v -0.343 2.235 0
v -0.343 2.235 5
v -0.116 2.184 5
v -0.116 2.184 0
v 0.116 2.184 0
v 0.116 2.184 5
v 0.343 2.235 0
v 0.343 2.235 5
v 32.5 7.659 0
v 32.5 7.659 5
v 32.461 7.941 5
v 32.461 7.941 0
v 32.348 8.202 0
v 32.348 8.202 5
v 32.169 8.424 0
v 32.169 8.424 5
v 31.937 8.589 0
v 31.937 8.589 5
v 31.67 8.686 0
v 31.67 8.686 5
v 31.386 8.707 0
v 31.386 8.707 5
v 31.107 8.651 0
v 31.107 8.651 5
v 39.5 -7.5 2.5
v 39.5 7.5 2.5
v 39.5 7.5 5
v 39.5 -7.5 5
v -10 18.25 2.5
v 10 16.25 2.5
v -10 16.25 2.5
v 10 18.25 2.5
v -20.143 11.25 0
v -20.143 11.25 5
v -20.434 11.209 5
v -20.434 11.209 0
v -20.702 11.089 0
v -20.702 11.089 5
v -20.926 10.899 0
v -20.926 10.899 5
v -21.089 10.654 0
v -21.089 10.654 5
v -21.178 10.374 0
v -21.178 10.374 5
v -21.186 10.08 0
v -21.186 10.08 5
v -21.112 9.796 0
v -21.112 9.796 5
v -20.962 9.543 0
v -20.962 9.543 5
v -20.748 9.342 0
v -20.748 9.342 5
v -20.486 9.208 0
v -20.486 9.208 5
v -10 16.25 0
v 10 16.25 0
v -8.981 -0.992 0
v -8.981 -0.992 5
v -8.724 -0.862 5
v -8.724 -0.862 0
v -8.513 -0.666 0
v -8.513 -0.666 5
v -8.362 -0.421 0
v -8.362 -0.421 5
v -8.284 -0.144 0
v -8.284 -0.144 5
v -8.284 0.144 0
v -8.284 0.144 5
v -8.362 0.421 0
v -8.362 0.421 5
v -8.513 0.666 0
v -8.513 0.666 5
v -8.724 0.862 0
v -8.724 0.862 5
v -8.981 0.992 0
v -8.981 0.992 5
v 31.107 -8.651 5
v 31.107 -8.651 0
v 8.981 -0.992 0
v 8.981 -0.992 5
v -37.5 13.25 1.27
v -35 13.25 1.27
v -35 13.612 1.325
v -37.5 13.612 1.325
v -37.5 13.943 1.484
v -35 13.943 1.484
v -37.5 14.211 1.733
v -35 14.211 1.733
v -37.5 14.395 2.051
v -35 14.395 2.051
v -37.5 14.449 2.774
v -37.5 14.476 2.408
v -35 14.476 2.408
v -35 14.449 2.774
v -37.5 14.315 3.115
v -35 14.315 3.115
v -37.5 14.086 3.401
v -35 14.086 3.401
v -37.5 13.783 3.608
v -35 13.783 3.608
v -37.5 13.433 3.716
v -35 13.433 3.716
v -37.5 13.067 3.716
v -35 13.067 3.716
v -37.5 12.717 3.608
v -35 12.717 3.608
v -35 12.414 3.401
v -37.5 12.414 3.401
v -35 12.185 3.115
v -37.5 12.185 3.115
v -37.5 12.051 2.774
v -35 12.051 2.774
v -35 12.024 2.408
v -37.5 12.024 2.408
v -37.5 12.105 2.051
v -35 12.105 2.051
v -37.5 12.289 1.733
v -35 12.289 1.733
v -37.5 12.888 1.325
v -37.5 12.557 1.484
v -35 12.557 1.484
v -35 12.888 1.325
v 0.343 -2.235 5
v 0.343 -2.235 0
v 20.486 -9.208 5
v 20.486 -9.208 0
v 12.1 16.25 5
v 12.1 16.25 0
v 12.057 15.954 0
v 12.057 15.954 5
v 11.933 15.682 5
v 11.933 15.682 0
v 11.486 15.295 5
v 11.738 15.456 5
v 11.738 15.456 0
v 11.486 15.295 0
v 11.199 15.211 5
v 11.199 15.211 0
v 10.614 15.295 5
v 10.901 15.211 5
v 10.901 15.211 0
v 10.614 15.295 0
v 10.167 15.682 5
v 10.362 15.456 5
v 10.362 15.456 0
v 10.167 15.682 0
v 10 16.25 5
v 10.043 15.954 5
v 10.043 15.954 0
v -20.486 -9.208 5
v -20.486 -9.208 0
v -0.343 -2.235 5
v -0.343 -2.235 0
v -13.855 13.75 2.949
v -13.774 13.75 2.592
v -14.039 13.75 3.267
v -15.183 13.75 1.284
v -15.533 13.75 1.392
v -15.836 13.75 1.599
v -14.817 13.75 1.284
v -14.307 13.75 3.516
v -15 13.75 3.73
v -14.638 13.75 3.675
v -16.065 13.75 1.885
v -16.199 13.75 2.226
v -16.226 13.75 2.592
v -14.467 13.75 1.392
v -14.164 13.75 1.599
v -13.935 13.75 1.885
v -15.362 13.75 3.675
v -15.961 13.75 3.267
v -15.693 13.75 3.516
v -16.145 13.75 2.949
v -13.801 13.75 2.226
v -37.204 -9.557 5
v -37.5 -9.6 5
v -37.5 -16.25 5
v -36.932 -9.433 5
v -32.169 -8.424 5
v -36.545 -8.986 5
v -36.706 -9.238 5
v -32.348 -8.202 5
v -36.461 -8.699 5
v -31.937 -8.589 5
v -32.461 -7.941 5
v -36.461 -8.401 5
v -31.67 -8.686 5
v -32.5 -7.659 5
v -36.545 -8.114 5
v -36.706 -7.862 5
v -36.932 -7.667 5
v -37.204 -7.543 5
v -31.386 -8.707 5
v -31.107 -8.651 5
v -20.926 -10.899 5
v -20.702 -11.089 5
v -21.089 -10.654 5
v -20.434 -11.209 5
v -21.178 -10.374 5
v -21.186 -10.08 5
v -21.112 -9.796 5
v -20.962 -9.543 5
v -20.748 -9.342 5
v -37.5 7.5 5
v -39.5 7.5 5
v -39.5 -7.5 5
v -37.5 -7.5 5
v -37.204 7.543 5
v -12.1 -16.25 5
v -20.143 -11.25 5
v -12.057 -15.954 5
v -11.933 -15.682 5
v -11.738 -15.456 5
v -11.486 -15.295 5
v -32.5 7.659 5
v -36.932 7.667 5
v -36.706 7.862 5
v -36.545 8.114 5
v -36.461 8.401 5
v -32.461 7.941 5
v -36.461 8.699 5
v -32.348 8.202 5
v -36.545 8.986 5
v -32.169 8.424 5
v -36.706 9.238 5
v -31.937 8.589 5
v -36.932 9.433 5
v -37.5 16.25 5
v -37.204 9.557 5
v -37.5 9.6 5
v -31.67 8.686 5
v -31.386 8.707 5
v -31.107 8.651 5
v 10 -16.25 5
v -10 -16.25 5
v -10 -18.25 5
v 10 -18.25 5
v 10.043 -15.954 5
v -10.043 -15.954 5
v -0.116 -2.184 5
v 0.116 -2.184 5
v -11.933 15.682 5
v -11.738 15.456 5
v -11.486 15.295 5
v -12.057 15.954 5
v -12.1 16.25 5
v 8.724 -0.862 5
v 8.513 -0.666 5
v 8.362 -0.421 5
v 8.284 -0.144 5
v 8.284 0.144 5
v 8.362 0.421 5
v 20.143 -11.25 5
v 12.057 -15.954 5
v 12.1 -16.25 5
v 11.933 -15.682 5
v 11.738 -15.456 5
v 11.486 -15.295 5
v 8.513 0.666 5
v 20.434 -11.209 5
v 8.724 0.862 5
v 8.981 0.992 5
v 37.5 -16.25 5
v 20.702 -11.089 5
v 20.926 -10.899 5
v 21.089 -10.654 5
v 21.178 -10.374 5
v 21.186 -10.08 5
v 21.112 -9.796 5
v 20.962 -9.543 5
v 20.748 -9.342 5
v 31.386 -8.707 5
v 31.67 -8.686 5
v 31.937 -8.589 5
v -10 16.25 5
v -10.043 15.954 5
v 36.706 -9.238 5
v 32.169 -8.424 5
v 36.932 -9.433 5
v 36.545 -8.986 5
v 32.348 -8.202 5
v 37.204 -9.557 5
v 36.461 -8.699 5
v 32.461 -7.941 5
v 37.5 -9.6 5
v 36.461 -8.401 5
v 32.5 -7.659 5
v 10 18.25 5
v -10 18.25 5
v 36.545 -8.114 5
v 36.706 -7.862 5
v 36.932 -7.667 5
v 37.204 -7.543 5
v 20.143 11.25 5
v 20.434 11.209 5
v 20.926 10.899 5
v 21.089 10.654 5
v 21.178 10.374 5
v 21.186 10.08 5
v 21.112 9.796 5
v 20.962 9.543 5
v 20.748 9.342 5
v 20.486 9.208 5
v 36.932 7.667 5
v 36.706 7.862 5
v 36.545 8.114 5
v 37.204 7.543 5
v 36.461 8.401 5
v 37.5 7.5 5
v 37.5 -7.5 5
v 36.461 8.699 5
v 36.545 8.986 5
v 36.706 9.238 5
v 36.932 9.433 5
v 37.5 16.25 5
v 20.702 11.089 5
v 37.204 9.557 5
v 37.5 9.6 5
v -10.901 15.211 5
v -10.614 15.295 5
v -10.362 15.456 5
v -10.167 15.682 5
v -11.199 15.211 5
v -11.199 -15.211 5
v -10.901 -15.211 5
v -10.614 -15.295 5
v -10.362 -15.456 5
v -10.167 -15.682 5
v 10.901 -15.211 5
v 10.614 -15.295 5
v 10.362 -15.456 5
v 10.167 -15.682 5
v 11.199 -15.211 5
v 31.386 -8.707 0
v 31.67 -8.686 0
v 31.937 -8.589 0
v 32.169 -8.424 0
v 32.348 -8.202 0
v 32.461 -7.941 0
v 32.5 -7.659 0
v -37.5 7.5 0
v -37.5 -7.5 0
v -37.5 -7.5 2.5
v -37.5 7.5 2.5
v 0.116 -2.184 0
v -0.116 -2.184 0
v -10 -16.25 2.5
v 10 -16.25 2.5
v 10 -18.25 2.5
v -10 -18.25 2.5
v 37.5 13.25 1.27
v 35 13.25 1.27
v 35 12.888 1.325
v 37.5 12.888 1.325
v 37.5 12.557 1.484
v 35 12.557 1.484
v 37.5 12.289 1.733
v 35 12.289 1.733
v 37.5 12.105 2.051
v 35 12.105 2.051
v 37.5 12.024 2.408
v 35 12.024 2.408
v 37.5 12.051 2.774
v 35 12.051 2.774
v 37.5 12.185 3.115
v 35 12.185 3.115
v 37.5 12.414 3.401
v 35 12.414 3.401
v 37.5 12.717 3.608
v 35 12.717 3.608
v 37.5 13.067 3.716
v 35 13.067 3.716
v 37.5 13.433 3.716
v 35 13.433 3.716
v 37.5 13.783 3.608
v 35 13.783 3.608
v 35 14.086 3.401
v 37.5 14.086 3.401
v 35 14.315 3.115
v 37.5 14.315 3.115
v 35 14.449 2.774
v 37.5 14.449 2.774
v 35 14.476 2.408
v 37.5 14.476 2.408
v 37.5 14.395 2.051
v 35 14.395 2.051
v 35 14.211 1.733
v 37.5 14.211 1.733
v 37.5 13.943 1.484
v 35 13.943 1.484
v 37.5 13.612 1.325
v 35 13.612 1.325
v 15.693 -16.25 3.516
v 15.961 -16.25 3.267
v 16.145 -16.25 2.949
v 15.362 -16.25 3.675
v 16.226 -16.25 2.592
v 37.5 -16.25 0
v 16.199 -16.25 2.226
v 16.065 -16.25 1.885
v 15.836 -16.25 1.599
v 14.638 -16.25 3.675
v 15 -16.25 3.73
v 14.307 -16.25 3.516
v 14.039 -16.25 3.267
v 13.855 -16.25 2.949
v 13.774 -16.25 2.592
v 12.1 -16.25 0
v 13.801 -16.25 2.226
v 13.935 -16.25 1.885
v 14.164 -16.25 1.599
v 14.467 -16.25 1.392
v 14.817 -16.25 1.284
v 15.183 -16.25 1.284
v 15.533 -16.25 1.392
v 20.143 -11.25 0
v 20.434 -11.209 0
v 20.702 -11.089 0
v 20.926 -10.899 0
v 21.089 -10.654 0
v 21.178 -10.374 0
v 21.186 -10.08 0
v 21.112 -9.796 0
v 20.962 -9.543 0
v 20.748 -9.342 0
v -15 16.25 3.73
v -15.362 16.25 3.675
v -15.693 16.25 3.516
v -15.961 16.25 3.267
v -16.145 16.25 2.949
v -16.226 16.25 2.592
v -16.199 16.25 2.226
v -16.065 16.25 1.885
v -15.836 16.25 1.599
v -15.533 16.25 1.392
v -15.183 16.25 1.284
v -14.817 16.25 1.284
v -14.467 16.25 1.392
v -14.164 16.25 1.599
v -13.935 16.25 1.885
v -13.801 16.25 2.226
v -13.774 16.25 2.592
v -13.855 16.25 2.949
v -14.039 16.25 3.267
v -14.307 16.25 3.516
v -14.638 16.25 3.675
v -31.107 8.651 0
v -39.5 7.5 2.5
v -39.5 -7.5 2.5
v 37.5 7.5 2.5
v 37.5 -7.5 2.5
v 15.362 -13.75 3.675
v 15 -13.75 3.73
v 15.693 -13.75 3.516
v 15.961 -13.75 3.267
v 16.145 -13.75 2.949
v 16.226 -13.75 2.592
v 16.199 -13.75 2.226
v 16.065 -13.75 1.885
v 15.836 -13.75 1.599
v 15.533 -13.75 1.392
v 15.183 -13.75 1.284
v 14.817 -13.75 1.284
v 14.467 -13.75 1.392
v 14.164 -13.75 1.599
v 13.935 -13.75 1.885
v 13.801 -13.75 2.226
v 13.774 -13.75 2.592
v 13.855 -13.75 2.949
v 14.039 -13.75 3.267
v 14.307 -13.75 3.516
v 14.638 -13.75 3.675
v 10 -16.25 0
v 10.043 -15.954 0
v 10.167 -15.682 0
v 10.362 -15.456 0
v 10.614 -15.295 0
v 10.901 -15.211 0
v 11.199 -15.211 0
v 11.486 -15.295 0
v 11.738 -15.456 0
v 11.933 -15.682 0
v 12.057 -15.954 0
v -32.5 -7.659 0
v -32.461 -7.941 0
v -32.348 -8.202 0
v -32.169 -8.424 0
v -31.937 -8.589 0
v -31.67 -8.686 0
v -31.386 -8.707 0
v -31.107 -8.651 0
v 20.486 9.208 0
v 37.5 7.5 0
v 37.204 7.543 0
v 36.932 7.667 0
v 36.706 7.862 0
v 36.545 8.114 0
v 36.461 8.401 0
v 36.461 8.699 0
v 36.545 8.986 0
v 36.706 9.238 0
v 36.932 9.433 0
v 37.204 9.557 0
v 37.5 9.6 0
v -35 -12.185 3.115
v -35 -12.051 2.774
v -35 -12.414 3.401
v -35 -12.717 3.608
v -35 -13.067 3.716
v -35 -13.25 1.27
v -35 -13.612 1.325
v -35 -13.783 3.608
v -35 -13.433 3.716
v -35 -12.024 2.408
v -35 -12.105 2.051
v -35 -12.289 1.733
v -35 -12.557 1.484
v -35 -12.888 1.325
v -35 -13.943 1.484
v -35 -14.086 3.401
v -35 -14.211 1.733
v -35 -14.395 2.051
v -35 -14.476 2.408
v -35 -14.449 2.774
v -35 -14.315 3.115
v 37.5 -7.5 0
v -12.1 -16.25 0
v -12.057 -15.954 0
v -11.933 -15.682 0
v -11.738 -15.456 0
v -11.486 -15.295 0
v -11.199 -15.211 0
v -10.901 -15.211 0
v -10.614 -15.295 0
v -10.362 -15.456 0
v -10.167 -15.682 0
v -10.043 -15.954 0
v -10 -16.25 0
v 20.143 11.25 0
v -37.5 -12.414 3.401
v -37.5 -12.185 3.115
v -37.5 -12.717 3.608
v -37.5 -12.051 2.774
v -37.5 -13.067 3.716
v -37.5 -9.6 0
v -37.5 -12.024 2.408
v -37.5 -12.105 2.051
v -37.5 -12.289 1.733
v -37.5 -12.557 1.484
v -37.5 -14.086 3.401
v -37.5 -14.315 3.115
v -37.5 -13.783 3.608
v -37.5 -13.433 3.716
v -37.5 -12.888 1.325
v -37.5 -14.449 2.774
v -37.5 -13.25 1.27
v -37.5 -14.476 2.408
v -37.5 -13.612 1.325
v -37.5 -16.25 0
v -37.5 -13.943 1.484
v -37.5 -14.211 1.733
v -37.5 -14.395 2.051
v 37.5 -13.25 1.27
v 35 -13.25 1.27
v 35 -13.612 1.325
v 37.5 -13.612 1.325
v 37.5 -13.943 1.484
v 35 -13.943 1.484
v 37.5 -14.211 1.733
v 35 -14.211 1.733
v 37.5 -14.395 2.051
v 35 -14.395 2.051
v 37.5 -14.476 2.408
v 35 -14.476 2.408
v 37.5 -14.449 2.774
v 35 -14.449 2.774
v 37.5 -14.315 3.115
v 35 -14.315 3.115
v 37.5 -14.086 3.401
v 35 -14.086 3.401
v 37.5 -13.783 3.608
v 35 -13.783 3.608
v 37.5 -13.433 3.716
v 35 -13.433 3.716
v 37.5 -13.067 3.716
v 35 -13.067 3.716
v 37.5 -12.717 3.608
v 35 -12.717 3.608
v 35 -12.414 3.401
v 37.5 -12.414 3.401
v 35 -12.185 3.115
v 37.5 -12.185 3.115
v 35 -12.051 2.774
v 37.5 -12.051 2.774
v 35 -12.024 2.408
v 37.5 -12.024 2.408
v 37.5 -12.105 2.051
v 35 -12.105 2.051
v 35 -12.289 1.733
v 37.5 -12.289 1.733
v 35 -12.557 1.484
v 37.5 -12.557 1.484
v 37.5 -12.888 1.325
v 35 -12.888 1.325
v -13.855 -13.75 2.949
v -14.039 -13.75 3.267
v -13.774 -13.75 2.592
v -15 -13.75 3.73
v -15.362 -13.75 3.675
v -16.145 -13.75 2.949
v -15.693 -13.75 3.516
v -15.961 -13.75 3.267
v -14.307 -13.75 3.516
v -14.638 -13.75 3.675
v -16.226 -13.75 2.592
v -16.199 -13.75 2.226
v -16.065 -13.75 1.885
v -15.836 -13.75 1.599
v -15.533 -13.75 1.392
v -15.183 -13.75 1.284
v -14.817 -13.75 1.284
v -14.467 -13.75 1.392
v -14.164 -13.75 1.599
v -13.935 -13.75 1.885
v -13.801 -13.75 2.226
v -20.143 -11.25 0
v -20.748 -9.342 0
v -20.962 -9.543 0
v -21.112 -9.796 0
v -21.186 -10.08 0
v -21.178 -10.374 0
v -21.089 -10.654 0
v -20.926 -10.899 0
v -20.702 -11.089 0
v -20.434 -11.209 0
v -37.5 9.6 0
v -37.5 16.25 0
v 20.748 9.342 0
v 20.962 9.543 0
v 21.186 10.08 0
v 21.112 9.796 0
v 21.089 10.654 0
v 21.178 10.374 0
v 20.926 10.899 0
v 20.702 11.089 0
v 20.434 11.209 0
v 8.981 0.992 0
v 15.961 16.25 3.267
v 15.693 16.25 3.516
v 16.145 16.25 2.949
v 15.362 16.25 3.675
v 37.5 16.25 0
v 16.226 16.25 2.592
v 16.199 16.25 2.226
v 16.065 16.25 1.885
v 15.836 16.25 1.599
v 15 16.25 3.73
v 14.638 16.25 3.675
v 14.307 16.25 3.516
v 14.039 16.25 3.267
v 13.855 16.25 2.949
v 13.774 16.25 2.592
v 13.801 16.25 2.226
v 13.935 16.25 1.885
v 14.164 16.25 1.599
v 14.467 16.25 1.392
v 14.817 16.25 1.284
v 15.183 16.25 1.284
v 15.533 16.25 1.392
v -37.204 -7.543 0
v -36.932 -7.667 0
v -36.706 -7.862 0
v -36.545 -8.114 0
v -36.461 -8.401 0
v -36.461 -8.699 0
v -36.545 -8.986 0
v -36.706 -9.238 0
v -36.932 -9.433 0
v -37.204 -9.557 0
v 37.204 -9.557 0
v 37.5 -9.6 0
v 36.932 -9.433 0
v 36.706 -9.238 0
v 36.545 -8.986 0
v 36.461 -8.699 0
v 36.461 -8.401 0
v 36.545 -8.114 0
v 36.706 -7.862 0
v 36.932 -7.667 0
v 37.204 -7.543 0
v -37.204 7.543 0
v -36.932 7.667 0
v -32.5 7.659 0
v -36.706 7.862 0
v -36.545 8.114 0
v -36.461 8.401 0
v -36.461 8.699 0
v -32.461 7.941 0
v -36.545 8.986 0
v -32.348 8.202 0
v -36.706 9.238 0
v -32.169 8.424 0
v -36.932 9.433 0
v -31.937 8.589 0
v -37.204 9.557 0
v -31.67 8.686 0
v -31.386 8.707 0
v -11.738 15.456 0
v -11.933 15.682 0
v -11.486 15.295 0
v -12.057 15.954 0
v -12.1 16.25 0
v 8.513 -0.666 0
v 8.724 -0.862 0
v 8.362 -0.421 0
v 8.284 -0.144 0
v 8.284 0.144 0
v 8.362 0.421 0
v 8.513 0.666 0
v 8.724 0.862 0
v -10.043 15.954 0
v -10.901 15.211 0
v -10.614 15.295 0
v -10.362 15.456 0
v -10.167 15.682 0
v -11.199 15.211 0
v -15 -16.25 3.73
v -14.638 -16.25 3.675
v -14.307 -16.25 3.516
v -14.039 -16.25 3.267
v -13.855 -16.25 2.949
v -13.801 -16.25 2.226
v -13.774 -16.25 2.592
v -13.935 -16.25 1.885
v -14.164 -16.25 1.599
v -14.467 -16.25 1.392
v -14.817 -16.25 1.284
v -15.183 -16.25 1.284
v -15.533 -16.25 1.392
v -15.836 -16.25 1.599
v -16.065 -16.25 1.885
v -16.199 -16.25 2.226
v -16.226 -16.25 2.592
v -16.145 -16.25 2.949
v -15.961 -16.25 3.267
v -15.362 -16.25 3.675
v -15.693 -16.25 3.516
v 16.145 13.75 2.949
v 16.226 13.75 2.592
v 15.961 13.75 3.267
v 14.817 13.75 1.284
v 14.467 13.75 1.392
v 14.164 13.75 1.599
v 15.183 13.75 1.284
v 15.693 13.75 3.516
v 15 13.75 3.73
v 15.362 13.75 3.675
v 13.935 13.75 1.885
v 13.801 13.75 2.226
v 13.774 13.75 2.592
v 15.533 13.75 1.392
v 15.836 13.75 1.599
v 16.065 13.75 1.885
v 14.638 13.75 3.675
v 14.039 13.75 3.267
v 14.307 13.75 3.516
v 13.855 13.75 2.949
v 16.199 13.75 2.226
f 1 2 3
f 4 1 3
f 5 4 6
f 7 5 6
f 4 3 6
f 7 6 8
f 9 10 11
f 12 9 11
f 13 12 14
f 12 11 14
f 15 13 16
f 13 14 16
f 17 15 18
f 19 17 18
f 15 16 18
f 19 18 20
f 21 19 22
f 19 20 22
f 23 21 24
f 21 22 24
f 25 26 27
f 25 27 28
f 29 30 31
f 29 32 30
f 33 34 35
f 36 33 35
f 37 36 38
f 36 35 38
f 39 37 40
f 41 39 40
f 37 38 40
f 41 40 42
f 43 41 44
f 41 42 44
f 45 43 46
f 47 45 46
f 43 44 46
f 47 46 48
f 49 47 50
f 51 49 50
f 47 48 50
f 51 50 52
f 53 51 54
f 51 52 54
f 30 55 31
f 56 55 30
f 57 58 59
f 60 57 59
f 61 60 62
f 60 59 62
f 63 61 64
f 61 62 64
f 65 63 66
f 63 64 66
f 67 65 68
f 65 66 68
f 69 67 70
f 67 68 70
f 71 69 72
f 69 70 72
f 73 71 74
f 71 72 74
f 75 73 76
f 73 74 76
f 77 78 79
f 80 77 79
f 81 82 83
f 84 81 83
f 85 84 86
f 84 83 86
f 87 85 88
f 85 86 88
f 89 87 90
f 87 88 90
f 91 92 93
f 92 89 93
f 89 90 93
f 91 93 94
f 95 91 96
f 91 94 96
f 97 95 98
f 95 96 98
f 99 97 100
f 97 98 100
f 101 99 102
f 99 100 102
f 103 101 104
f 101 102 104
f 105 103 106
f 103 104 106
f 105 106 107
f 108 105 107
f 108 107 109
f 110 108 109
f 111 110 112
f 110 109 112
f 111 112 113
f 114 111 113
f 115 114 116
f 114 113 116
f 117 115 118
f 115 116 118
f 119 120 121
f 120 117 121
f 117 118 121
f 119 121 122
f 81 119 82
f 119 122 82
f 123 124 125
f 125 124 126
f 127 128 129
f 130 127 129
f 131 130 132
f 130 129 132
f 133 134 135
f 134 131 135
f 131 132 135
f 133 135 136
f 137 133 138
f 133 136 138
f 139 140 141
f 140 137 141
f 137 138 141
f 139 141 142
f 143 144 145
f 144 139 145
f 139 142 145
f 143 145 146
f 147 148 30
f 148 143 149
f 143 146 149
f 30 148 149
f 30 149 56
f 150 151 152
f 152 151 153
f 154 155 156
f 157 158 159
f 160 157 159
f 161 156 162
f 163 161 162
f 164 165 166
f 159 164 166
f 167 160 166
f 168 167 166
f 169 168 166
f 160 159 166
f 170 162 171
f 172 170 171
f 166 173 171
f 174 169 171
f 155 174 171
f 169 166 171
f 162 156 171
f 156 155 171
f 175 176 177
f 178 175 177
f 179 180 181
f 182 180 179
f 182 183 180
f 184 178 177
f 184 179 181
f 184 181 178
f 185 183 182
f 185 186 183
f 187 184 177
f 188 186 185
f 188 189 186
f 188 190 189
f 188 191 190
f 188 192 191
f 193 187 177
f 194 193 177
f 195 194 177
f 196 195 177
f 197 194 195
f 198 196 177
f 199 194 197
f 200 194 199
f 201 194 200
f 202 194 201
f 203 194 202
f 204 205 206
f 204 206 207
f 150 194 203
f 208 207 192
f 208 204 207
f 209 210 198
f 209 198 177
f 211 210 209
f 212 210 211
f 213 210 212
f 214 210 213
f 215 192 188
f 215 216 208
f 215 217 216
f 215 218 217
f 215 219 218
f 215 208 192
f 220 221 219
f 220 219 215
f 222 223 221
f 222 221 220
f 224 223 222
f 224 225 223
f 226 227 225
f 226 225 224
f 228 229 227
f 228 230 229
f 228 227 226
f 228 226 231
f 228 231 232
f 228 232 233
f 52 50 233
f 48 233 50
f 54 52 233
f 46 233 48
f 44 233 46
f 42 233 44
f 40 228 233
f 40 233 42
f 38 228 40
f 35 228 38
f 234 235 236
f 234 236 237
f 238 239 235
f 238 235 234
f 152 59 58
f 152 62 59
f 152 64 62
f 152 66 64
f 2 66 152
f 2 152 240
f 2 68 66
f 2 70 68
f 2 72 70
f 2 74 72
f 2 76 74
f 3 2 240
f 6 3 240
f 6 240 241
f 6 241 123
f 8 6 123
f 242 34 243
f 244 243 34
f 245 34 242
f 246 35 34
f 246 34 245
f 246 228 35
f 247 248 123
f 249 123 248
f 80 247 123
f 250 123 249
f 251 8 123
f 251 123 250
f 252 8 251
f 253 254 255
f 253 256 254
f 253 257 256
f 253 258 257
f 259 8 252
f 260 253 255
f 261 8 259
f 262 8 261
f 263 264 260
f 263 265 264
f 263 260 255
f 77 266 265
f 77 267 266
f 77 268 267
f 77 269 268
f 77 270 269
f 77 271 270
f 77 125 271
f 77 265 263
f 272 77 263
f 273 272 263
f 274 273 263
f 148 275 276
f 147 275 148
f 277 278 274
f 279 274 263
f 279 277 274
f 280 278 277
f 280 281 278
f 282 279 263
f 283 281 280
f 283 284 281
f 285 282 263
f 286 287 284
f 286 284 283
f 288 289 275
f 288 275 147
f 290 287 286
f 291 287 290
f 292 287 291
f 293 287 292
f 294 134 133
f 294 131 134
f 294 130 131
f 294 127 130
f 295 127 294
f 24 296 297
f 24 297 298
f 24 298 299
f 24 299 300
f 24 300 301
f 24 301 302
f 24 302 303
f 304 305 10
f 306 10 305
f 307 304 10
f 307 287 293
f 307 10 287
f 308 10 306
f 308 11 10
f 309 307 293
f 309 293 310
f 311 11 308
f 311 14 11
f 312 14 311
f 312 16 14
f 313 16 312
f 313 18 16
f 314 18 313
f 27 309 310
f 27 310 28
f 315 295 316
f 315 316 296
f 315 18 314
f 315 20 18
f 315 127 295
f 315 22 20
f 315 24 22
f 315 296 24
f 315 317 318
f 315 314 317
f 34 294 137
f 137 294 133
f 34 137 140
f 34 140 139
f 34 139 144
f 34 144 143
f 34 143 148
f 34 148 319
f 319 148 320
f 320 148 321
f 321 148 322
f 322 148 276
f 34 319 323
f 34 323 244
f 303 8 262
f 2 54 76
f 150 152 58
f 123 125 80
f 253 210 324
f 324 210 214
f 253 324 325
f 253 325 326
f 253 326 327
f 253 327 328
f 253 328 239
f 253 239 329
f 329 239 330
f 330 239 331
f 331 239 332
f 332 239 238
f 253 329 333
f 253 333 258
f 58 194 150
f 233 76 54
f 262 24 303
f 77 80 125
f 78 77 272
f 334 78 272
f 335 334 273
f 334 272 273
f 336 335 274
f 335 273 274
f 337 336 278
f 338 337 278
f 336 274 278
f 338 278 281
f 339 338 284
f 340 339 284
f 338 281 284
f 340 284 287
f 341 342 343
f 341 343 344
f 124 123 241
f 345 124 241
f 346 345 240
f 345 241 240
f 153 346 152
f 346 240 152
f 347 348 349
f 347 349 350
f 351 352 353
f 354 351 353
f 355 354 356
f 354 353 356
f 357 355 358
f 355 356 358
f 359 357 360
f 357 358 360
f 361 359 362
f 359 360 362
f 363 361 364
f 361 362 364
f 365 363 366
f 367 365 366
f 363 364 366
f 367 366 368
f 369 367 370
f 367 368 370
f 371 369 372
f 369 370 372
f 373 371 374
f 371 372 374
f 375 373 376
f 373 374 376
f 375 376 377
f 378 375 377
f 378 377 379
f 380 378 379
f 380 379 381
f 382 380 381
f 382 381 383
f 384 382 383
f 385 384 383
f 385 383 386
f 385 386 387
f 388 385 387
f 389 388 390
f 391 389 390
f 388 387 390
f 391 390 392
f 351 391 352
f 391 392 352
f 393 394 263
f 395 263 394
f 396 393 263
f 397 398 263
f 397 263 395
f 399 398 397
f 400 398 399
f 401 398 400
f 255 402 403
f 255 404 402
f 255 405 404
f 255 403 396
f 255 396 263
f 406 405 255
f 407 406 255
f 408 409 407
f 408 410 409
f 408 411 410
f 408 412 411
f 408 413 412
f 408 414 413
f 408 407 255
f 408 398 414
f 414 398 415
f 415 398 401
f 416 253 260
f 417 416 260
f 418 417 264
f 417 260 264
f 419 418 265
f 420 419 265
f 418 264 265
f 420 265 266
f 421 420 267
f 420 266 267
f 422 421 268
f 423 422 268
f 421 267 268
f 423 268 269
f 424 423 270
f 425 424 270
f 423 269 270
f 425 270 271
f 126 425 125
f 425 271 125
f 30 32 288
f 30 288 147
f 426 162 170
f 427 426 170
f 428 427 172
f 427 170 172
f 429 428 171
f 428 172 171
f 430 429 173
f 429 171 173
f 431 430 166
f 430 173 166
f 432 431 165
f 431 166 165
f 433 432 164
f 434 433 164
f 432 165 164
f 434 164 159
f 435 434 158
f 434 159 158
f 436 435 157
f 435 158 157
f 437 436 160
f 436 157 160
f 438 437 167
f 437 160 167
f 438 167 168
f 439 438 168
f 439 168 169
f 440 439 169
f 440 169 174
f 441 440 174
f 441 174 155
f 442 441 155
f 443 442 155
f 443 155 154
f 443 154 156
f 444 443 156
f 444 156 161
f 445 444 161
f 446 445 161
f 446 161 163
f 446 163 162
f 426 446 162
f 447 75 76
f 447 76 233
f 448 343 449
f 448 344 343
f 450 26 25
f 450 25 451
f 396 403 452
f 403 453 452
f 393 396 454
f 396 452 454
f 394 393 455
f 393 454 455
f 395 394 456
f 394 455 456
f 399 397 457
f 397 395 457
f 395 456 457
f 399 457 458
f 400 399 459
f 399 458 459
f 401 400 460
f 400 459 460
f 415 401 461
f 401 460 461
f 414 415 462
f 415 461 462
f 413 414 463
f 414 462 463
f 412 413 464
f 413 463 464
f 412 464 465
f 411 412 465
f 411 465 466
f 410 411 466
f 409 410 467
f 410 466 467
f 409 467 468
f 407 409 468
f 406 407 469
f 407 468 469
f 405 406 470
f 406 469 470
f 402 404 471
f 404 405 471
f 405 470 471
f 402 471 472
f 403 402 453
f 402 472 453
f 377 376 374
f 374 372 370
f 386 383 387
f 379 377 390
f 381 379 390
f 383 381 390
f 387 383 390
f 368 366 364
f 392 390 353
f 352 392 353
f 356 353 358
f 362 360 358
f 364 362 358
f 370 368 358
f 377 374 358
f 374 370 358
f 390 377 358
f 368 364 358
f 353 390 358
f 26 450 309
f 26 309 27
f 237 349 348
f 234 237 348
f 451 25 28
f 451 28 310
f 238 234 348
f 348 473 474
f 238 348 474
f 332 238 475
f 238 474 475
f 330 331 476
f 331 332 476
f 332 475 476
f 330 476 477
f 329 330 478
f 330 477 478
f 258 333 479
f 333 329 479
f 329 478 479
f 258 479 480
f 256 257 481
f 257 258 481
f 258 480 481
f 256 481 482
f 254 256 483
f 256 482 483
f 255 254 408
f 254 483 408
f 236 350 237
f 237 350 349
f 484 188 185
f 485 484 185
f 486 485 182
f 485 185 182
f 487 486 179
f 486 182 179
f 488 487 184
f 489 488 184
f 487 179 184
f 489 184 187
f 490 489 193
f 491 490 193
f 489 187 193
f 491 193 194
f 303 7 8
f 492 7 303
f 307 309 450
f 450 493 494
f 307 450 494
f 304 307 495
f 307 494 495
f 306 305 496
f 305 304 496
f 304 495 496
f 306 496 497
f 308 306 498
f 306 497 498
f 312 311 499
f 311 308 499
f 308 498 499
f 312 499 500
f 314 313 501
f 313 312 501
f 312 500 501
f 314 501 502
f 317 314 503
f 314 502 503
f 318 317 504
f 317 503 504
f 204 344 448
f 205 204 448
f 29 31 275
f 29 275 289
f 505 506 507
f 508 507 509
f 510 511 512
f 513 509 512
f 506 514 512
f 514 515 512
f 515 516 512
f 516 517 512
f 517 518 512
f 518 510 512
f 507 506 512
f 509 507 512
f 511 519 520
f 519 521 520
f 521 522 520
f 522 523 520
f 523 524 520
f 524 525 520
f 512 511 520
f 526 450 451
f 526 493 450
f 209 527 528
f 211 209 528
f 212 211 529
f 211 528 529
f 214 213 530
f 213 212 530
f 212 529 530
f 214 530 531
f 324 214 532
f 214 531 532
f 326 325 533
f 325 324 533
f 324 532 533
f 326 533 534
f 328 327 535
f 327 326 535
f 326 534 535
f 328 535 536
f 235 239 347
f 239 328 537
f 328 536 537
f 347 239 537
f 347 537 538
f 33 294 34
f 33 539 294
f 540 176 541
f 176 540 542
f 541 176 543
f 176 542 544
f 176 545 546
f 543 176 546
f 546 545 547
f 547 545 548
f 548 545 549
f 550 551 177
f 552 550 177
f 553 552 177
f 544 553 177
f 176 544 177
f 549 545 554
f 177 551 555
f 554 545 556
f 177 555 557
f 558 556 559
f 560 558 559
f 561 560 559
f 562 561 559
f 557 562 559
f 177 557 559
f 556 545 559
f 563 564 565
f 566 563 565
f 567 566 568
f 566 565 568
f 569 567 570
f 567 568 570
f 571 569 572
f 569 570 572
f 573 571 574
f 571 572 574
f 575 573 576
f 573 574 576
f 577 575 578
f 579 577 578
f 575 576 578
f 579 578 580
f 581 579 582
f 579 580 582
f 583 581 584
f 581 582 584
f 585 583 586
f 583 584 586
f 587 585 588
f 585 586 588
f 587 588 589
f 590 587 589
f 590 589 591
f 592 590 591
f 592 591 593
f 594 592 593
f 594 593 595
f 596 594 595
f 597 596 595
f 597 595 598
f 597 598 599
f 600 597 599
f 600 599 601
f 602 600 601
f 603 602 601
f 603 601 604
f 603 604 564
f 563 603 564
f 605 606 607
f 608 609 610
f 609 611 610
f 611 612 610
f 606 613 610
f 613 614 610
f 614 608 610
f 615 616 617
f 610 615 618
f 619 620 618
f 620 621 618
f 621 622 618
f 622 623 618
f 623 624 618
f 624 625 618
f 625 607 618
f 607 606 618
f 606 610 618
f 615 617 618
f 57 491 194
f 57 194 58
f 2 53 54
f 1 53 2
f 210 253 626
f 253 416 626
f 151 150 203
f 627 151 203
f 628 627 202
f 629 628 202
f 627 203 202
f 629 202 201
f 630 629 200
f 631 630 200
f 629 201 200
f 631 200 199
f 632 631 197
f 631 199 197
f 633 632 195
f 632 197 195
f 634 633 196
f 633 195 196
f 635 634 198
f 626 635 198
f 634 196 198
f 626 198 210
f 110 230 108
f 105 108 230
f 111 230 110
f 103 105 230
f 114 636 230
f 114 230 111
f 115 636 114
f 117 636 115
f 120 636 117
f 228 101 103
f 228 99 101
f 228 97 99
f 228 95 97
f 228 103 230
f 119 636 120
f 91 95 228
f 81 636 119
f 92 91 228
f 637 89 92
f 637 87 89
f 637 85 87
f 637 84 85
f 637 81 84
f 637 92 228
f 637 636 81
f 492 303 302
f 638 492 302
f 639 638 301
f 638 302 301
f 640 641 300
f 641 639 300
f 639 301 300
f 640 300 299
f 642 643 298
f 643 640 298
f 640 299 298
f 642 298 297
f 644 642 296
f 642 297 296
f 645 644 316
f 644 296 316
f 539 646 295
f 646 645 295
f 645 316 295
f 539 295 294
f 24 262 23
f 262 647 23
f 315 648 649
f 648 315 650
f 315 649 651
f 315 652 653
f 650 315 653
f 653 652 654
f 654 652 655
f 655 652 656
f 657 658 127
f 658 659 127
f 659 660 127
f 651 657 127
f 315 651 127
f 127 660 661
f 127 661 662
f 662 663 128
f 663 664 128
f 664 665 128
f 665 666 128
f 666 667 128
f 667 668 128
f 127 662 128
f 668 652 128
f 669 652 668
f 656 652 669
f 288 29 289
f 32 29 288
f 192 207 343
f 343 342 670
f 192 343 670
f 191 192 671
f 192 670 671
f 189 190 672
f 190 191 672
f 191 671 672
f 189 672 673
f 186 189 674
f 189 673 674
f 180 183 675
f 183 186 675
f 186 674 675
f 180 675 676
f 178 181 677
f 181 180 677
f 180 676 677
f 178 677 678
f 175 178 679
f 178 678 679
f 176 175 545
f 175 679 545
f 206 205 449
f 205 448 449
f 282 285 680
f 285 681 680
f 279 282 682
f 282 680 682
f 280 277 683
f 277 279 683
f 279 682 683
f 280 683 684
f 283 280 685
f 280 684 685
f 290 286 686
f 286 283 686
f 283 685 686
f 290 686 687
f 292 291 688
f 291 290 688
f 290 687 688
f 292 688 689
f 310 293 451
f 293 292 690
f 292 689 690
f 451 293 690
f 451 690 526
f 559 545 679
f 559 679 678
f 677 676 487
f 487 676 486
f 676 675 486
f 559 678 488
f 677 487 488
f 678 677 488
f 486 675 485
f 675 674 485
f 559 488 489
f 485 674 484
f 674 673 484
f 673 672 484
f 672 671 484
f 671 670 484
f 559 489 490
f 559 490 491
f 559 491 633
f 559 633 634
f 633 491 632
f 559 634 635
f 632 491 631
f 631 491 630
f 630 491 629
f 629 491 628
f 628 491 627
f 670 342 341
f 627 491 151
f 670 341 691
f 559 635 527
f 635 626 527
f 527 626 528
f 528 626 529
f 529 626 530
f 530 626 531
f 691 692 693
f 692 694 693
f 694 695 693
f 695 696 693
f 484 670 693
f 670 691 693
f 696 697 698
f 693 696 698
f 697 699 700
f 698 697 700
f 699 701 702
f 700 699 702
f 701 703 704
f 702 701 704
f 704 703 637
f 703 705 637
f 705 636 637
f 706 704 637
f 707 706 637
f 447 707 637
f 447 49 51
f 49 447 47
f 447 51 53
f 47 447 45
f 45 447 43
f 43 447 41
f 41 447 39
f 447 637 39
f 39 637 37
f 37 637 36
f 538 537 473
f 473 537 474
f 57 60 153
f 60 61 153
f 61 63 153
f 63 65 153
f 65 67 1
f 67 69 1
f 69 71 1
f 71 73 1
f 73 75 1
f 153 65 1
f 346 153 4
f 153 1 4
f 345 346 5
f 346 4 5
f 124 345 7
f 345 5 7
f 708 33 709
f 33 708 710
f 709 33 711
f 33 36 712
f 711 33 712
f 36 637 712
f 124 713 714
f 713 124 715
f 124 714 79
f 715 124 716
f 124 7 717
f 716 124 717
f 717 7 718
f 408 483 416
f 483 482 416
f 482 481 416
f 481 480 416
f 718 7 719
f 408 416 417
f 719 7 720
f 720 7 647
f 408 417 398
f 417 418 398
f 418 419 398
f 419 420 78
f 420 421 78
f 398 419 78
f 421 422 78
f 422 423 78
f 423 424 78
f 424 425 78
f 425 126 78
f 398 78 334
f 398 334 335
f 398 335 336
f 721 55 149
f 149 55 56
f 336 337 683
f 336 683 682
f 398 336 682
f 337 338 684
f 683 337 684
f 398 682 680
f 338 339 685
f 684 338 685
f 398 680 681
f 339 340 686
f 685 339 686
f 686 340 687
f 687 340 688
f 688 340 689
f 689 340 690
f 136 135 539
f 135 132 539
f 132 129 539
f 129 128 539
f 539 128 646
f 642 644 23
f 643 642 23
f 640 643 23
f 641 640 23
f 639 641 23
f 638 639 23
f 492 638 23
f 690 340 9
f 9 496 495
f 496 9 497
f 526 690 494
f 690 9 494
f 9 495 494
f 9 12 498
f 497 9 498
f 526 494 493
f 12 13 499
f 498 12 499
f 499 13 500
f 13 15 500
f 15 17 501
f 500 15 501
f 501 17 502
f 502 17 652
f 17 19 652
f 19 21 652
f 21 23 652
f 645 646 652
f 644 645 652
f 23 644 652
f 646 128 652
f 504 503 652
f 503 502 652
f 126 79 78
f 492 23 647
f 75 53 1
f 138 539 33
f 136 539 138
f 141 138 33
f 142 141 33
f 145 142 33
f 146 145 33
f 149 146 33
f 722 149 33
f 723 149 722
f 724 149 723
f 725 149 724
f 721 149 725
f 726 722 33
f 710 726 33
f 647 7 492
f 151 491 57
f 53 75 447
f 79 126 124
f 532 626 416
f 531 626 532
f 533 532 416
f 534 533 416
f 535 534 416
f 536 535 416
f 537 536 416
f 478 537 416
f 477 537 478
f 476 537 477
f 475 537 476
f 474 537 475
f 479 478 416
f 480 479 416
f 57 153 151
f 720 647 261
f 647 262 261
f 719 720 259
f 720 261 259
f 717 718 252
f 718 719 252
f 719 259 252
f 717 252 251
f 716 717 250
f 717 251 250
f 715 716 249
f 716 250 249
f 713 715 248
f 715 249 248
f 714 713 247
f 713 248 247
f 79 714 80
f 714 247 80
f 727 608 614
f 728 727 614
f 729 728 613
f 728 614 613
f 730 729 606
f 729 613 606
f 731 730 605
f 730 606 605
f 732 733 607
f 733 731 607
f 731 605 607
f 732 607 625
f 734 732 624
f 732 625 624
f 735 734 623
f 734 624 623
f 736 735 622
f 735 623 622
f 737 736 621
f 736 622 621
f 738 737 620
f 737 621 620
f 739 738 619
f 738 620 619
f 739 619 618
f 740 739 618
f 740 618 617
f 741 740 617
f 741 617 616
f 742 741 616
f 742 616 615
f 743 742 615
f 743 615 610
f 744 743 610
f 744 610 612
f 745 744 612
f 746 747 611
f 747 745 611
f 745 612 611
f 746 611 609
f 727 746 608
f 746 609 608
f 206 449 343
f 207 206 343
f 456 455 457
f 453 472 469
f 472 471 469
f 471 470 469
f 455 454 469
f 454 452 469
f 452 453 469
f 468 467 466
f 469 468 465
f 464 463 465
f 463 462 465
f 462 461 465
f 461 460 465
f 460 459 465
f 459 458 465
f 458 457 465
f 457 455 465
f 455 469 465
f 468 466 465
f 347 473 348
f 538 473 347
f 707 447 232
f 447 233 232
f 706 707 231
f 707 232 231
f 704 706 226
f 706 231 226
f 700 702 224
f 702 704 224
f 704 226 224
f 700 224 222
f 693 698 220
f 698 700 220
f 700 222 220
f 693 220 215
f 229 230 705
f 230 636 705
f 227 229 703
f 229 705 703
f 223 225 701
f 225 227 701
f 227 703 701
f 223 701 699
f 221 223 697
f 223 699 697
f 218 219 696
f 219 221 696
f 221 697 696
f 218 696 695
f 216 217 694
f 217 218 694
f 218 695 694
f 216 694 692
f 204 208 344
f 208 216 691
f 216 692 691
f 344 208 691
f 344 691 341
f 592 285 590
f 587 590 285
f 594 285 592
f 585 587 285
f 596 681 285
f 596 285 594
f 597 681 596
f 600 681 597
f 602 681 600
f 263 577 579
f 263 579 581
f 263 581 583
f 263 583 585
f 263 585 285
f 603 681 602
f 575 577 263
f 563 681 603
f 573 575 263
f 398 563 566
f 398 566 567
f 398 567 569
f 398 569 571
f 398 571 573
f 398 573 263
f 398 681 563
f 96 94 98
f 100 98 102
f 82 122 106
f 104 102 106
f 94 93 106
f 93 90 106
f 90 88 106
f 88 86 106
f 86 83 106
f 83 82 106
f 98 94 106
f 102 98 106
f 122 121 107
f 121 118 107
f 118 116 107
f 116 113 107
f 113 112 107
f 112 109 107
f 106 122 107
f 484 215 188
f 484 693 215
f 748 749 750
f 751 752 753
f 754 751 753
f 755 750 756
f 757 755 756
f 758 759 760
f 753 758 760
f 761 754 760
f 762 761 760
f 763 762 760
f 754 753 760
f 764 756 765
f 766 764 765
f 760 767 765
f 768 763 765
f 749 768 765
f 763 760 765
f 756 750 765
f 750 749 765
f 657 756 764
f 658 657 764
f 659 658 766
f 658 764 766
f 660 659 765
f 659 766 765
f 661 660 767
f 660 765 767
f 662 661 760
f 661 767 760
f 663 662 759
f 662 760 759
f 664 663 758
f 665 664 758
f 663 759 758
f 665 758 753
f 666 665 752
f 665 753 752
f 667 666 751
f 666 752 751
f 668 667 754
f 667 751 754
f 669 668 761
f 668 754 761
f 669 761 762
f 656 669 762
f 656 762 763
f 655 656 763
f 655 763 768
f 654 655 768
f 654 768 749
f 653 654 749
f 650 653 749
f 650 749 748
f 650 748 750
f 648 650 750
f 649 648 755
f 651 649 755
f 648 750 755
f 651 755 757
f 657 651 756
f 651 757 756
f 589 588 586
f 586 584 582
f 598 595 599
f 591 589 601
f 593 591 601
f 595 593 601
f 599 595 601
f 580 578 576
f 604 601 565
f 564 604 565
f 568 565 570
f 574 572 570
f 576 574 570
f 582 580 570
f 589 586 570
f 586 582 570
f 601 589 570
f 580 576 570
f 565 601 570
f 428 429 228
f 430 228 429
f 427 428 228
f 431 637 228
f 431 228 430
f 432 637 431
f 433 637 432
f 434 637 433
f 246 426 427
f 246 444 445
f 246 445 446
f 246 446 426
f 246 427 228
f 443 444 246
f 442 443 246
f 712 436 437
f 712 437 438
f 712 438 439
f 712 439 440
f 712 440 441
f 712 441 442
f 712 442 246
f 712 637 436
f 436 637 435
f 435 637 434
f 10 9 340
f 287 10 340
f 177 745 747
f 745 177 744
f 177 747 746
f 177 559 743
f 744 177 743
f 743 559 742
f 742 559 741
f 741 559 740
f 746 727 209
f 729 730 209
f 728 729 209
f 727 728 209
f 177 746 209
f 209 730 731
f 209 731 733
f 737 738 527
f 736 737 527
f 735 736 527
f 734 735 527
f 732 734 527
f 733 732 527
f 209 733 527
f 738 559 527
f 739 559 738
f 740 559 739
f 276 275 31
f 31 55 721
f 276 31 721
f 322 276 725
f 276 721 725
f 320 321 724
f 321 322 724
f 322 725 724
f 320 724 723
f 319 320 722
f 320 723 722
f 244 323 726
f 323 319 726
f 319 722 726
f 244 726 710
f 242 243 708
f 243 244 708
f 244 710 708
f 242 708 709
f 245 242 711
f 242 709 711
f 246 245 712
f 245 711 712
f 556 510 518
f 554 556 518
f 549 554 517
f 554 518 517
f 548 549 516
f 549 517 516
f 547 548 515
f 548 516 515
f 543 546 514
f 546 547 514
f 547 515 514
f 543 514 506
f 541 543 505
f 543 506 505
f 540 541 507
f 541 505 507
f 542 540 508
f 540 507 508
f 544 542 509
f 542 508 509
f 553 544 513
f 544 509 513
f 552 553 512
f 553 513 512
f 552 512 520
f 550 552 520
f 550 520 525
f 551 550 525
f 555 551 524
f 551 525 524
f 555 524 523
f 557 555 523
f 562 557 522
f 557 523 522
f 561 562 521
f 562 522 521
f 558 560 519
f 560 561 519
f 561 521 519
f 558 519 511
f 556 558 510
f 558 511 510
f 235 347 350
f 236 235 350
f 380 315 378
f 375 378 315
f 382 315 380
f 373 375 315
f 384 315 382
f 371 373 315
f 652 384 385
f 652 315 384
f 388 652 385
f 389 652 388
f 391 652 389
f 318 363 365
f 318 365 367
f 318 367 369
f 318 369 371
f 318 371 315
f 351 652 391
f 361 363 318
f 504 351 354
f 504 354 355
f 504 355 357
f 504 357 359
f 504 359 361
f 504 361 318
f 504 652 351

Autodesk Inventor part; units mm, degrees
ref_plane "YZ Plane" through (0, 0, 0) normal (1, 0, 0) x (0, 1, 0)
ref_plane "XZ Plane" through (0, 0, 0) normal (0, 1, 0) x (-1, 0, 0)
ref_plane "XY Plane" through (0, 0, 0) normal (0, 0, 1) x (1, 0, 0)
sketch "スケッチ1" plane through (0, 0, 0) normal (0, 0, 1) x (1, 0, 0)
  line L0 (-37.5, 9.6) -> (-37.5, 16.25)
  line L1 (-37.5, 16.25) -> (-20, 16.25)
  line L2 (20, 16.25) -> (37.5, 16.25)
  line L3 (37.5, 16.25) -> (37.5, 9.6)
  line L4 (0, 0) -> (0, 16.25) construction
  line L5 (0, 0) -> (39.5, 0) construction
  line L6 (37.5, 7.5) -> (39.5, 7.5)
  line L7 (39.5, 7.5) -> (39.5, -7.5)
  line L8 (39.5, -7.5) -> (37.5, -7.5)
  line L9 (-20, -16.25) -> (20, -16.25) construction
  line L10 (20, -16.25) -> (20, 16.25) construction
  line L11 (20, 16.25) -> (-20, 16.25) construction
  line L12 (-20, 16.25) -> (-20, -16.25) construction
  line L13 (-20, -16.25) -> (20, 16.25) construction
  line L14 (20, -16.25) -> (-20, 16.25) construction
  line L15 (-37.5, -16.25) -> (37.5, -16.25) construction
  line L16 (37.5, -16.25) -> (37.5, 16.25) construction
  line L17 (37.5, 16.25) -> (-37.5, 16.25) construction
  line L18 (-37.5, 16.25) -> (-37.5, -16.25) construction
  line L19 (-37.5, -16.25) -> (37.5, 16.25) construction
  line L20 (37.5, -16.25) -> (-37.5, 16.25) construction
  arc A0 (37.5, 9.6) -> (37.5, 7.5) centre (37.5, 8.55) ccw
  arc A1 (37.5, -7.5) -> (37.5, -9.6) centre (37.5, -8.55) ccw
  line L21 (37.5, -9.6) -> (37.5, -16.25)
  line L22 (37.5, -16.25) -> (20, -16.25)
  line L23 (20, -16.25) -> (12.1, -16.25)
  line L24 (-20, 16.25) -> (-12.1, 16.25)
  line L25 (-10, 16.25) -> (-10, 18.25)
  line L26 (-10, 18.25) -> (10, 18.25)
  line L27 (10, 18.25) -> (10, 16.25)
  line L28 (20, 16.25) -> (12.1, 16.25)
  arc A2 (-12.1, 16.25) -> (-10, 16.25) centre (-11.05, 16.25) ccw
  arc A3 (10, 16.25) -> (12.1, 16.25) centre (11.05, 16.25) ccw
  line L29 (-37.5, 7.5) -> (-39.5, 7.5)
  line L30 (-39.5, 7.5) -> (-39.5, -7.5)
  line L31 (-39.5, -7.5) -> (-37.5, -7.5)
  arc A4 (-37.5, 7.5) -> (-37.5, 9.6) centre (-37.5, 8.55) ccw
  arc A5 (-37.5, -9.6) -> (-37.5, -7.5) centre (-37.5, -8.55) ccw
  line L32 (-37.5, -9.6) -> (-37.5, -16.25)
  line L33 (-37.5, -16.25) -> (-20, -16.25)
  line L34 (-20, -16.25) -> (-12.1, -16.25)
  line L35 (-10, -16.25) -> (-10, -18.25)
  line L36 (-10, -18.25) -> (10, -18.25)
  line L37 (10, -18.25) -> (10, -16.25)
  arc A6 (-10, -16.25) -> (-12.1, -16.25) centre (-11.05, -16.25) ccw
  arc A7 (12.1, -16.25) -> (10, -16.25) centre (11.05, -16.25) ccw
  line L38 (-16.55, 19.1799) -> (-13.45, 19.1799) construction
  line L39 (-13.45, 19.1799) -> (-13.45, 12.4242) construction
  line L40 (-13.45, 12.4242) -> (-16.55, 12.4242) construction
  line L41 (-16.55, 12.4242) -> (-16.55, 19.1799) construction
  line L42 (-15, 19.1799) -> (-15, 12.4242) construction
  point P0 (0, 18.25)
  point P1 (0, 0)
  dimension "d0" = 1.05
  dimension "d1" = 32.5
  dimension "d2" = 75
  dimension "d3" = 40
  dimension "d23" = 2
  dimension "d30" = 2
  dimension "d34" = 8.75
  dimension "d53" = 20
  dimension "d54" = 3.1
  dimension "d55" = 5
  dimension "d85" = 32.5
extrude "押し出し1" add sketch "スケッチ1" along normal blind 5
sketch "スケッチ2" plane through (0, 0, 0) normal (0, 0, -1) x (-1, 0, 0)
  line L0 (37.5, 9.6) -> (37.5, 16.25) projected
  line L1 (-37.5, 16.25) -> (-37.5, 9.6) projected
  line L2 (-45.6427, 17.3125) -> (-37.5, 17.3125)
  line L3 (-37.5, 17.3125) -> (-37.5, -16.751)
  line L4 (-37.5, -16.751) -> (-45.6427, -16.751)
  line L5 (-45.6427, -16.751) -> (-45.6427, 17.3125)
  line L6 (37.5, 21.1805) -> (43.358, 21.1805)
  line L7 (43.358, 21.1805) -> (43.358, -13.6193)
  line L8 (43.358, -13.6193) -> (37.5, -13.6193)
  line L9 (37.5, -13.6193) -> (37.5, 21.1805)
  line L10 (-20, -16.25) -> (-12.1, -16.25)
  line L11 (-17.1371, 25.1848) -> (11.8342, 25.1848)
  line L12 (11.8342, 25.1848) -> (11.8342, 16.25)
  line L13 (11.8342, 16.25) -> (-17.1371, 16.25)
  line L14 (-17.1371, 16.25) -> (-17.1371, 25.1848)
  line L15 (-13.151, -21.5857) -> (17.7795, -21.5857)
  line L16 (17.7795, -21.5857) -> (17.7795, -16.25)
  line L17 (17.7795, -16.25) -> (-13.151, -16.25)
  line L18 (-13.151, -16.25) -> (-13.151, -21.5857)
  line L19 (-12.1, 16.25) -> (-37.5, 16.25)
  line L20 (-37.5, -16.25) -> (-12.1, -16.25)
  point P0 (0, 0)
extrude "押し出し2" cut sketch "スケッチ2" against normal blind 2.5
sketch "スケッチ3" plane through (12.1, 16.25, 0) normal (0, 1, 0) x (1, 0, 0)
  line L0 (-2.1, 0) -> (-2.1, -5) projected
  line L1 (-2.1, -5) -> (-22.1, -5) construction
  line L2 (-12.1, -5) -> (-12.1, 7.4607) construction
  line L3 (25.4, 0) -> (25.4, -5) projected
  point P0 (-12.1, 0)
  point P1 (2.9, -2.5)
  point P2 (-27.1, -2.5)
  point P3 (25.4, -2.5)
  dimension "d60" = 5
hole "穴1" at (15, 16.25, 2.5) at (-15, 16.25, 2.5) direction (0, -1, 0) diameter 2.459 depth 2.5 thread size "M3x0.5" class "6H" standard "ISO Metric profile"
mirror "ミラー1" about plane through (0, 0, 0) normal (0, 1, 0) of "穴1"
sketch "スケッチ4" plane through (37.5, -16.25, 5) normal (1, 0, 0) x (0, 0, -1)
  line L0 (5, 16.25) -> (0, 16.25) construction
  line L1 (0, 23.75) -> (0, 8.75) construction
  line L2 (5, 6.65) -> (0, 6.65) projected
  line L3 (5, 0) -> (0, 0) projected
  point P0 (2.5, 3)
  point P1 (2.5, 29.5)
  point P2 (2.5, 6.65)
  dimension "d86" = 3
  dimension "d87" = 26.5
hole "穴2" at (37.5, -13.25, 2.5) at (37.5, 13.25, 2.5) direction (-1, 0, 0) diameter 2.459 depth 2.5 thread size "M3x0.5" class "6H" standard "ISO Metric profile"
mirror "ミラー2" about plane through (0, 0, 0) normal (1, 0, 0) of "穴2"
sketch "スケッチ5" plane through (0, 0, 0) normal (0, 0, -1) x (-1, 0, 0)
  line L0 (10, 16.25) -> (-10, 16.25) projected
  line L1 (-37.5, 7.5) -> (-37.5, 9.6) projected
  line L2 (-32.5, -11.25) -> (32.5, -11.25) construction
  line L3 (32.5, -11.25) -> (32.5, 11.25) construction
  line L4 (32.5, 11.25) -> (-32.5, 11.25) construction
  line L5 (-32.5, 11.25) -> (-32.5, -11.25) construction
  line L6 (-32.5, -11.25) -> (32.5, 11.25) construction
  line L7 (32.5, -11.25) -> (-32.5, 11.25) construction
  line L8 (-32.5, 9.1336) -> (-32.5, -9.1336)
  line L9 (-32.5, -9.1336) -> (-6.1141, 0)
  line L10 (-6.1141, 0) -> (-32.5, 9.1336)
  line L11 (-26.3859, 11.25) -> (26.3859, 11.25)
  line L12 (26.3859, 11.25) -> (0, 2.1164)
  line L13 (0, 2.1164) -> (-26.3859, 11.25)
  line L14 (-26.3859, -11.25) -> (26.3859, -11.25)
  line L15 (26.3859, -11.25) -> (0, -2.1164)
  line L16 (0, -2.1164) -> (-26.3859, -11.25)
  line L17 (32.5, 9.1336) -> (32.5, -9.1336)
  line L18 (32.5, -9.1336) -> (6.1141, 0)
  line L19 (6.1141, 0) -> (32.5, 9.1336)
  point P0 (-12.1, 16.25)
  point P1 (-20, 16.25)
  point P2 (-37.5, 16.25)
  point P3 (0, 0)
  dimension "d76" = 5
  dimension "d77" = 5
  dimension "d78" = 4
  dimension "d79" = 4
  dimension "d80" = 4
  dimension "d81" = 4
extrude "押し出し3" cut sketch "スケッチ5" against normal blind 10
fillet "フィレット1" radius 1.05 12 edges at (32.5, 9.1336, 2.5) (32.5, -9.1336, 2.5) (26.3859, 11.25, 2.5) (6.1141, 0, 2.5) (0, -2.1164, 2.5) (0, 2.1164, 2.5) (-32.5, -9.1336, 2.5) (26.3859, -11.25, 2.5) (-32.5, 9.1336, 2.5) (-26.3859, 11.25, 2.5) (-26.3859, -11.25, 2.5) (-6.1141, 0, 2.5)
equation "\"d85\" = d1"
equation "\"d60\" = d55"
equation "\"d77\" = d76"
equation "\"d79\" = d78"
equation "\"d80\" = d79"
equation "\"d81\" = d78"
equation "\"d48\" = 26.5"
equation "\"d52\" = 5"
properties part number "Trunk_horizontal_frame_04" material "アセタール樹脂、黒"
